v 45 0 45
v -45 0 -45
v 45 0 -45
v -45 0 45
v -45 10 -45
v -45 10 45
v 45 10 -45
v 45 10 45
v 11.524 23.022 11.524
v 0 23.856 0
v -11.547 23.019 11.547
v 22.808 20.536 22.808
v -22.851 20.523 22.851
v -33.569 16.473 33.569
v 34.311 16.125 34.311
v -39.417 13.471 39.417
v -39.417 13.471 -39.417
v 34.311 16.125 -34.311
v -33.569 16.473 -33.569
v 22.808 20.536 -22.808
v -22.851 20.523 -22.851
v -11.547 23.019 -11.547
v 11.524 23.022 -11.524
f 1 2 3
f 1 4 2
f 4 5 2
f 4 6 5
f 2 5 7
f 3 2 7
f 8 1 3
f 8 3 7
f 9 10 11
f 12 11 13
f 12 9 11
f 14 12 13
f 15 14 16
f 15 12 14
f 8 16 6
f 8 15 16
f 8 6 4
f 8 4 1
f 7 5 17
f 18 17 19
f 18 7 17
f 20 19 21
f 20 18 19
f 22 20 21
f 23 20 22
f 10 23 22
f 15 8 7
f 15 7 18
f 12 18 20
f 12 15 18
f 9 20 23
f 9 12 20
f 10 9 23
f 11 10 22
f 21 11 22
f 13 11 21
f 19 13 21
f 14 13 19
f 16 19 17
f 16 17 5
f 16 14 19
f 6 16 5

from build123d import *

# Parameters (mm, degrees)
BOSS_EXTRUDE6_DEPTH = 45
BOSS_EXTRUDE8_DEPTH = 45


with BuildPart() as part:
    # Sketch4 → Boss-Extrude6 (new, symmetric)
    with BuildSketch(Plane.XY):
        with BuildLine():
            Line((-45, 0), (45, 0))
            Line((45, 0), (45, 10))
            ThreePointArc((45, 10), (0, 23.856217223), (-45, 10))
            Line((-45, 10), (-45, 0))
        make_face()
    extrude(amount=BOSS_EXTRUDE6_DEPTH, both=True)


with BuildPart() as body_2:
    # Sketch9 → Boss-Extrude8 (new, symmetric)
    with BuildSketch(Plane(origin=(0, 0, 0), x_dir=(0, 0, -1), z_dir=(1, 0, 0))):
        with BuildLine():
            Line((-45, 0), (45, 0))
            Line((45, 0), (45, 10))
            ThreePointArc((45, 10), (0, 23.856217223), (-45, 10))
            Line((-45, 10), (-45, 0))
        make_face()
    extrude(amount=BOSS_EXTRUDE8_DEPTH, both=True)


with BuildPart() as part_1:
    add(part.part)

    # Combine1: intersect body 2
    add(body_2.part, mode=Mode.INTERSECT)


solid = part_1.part
